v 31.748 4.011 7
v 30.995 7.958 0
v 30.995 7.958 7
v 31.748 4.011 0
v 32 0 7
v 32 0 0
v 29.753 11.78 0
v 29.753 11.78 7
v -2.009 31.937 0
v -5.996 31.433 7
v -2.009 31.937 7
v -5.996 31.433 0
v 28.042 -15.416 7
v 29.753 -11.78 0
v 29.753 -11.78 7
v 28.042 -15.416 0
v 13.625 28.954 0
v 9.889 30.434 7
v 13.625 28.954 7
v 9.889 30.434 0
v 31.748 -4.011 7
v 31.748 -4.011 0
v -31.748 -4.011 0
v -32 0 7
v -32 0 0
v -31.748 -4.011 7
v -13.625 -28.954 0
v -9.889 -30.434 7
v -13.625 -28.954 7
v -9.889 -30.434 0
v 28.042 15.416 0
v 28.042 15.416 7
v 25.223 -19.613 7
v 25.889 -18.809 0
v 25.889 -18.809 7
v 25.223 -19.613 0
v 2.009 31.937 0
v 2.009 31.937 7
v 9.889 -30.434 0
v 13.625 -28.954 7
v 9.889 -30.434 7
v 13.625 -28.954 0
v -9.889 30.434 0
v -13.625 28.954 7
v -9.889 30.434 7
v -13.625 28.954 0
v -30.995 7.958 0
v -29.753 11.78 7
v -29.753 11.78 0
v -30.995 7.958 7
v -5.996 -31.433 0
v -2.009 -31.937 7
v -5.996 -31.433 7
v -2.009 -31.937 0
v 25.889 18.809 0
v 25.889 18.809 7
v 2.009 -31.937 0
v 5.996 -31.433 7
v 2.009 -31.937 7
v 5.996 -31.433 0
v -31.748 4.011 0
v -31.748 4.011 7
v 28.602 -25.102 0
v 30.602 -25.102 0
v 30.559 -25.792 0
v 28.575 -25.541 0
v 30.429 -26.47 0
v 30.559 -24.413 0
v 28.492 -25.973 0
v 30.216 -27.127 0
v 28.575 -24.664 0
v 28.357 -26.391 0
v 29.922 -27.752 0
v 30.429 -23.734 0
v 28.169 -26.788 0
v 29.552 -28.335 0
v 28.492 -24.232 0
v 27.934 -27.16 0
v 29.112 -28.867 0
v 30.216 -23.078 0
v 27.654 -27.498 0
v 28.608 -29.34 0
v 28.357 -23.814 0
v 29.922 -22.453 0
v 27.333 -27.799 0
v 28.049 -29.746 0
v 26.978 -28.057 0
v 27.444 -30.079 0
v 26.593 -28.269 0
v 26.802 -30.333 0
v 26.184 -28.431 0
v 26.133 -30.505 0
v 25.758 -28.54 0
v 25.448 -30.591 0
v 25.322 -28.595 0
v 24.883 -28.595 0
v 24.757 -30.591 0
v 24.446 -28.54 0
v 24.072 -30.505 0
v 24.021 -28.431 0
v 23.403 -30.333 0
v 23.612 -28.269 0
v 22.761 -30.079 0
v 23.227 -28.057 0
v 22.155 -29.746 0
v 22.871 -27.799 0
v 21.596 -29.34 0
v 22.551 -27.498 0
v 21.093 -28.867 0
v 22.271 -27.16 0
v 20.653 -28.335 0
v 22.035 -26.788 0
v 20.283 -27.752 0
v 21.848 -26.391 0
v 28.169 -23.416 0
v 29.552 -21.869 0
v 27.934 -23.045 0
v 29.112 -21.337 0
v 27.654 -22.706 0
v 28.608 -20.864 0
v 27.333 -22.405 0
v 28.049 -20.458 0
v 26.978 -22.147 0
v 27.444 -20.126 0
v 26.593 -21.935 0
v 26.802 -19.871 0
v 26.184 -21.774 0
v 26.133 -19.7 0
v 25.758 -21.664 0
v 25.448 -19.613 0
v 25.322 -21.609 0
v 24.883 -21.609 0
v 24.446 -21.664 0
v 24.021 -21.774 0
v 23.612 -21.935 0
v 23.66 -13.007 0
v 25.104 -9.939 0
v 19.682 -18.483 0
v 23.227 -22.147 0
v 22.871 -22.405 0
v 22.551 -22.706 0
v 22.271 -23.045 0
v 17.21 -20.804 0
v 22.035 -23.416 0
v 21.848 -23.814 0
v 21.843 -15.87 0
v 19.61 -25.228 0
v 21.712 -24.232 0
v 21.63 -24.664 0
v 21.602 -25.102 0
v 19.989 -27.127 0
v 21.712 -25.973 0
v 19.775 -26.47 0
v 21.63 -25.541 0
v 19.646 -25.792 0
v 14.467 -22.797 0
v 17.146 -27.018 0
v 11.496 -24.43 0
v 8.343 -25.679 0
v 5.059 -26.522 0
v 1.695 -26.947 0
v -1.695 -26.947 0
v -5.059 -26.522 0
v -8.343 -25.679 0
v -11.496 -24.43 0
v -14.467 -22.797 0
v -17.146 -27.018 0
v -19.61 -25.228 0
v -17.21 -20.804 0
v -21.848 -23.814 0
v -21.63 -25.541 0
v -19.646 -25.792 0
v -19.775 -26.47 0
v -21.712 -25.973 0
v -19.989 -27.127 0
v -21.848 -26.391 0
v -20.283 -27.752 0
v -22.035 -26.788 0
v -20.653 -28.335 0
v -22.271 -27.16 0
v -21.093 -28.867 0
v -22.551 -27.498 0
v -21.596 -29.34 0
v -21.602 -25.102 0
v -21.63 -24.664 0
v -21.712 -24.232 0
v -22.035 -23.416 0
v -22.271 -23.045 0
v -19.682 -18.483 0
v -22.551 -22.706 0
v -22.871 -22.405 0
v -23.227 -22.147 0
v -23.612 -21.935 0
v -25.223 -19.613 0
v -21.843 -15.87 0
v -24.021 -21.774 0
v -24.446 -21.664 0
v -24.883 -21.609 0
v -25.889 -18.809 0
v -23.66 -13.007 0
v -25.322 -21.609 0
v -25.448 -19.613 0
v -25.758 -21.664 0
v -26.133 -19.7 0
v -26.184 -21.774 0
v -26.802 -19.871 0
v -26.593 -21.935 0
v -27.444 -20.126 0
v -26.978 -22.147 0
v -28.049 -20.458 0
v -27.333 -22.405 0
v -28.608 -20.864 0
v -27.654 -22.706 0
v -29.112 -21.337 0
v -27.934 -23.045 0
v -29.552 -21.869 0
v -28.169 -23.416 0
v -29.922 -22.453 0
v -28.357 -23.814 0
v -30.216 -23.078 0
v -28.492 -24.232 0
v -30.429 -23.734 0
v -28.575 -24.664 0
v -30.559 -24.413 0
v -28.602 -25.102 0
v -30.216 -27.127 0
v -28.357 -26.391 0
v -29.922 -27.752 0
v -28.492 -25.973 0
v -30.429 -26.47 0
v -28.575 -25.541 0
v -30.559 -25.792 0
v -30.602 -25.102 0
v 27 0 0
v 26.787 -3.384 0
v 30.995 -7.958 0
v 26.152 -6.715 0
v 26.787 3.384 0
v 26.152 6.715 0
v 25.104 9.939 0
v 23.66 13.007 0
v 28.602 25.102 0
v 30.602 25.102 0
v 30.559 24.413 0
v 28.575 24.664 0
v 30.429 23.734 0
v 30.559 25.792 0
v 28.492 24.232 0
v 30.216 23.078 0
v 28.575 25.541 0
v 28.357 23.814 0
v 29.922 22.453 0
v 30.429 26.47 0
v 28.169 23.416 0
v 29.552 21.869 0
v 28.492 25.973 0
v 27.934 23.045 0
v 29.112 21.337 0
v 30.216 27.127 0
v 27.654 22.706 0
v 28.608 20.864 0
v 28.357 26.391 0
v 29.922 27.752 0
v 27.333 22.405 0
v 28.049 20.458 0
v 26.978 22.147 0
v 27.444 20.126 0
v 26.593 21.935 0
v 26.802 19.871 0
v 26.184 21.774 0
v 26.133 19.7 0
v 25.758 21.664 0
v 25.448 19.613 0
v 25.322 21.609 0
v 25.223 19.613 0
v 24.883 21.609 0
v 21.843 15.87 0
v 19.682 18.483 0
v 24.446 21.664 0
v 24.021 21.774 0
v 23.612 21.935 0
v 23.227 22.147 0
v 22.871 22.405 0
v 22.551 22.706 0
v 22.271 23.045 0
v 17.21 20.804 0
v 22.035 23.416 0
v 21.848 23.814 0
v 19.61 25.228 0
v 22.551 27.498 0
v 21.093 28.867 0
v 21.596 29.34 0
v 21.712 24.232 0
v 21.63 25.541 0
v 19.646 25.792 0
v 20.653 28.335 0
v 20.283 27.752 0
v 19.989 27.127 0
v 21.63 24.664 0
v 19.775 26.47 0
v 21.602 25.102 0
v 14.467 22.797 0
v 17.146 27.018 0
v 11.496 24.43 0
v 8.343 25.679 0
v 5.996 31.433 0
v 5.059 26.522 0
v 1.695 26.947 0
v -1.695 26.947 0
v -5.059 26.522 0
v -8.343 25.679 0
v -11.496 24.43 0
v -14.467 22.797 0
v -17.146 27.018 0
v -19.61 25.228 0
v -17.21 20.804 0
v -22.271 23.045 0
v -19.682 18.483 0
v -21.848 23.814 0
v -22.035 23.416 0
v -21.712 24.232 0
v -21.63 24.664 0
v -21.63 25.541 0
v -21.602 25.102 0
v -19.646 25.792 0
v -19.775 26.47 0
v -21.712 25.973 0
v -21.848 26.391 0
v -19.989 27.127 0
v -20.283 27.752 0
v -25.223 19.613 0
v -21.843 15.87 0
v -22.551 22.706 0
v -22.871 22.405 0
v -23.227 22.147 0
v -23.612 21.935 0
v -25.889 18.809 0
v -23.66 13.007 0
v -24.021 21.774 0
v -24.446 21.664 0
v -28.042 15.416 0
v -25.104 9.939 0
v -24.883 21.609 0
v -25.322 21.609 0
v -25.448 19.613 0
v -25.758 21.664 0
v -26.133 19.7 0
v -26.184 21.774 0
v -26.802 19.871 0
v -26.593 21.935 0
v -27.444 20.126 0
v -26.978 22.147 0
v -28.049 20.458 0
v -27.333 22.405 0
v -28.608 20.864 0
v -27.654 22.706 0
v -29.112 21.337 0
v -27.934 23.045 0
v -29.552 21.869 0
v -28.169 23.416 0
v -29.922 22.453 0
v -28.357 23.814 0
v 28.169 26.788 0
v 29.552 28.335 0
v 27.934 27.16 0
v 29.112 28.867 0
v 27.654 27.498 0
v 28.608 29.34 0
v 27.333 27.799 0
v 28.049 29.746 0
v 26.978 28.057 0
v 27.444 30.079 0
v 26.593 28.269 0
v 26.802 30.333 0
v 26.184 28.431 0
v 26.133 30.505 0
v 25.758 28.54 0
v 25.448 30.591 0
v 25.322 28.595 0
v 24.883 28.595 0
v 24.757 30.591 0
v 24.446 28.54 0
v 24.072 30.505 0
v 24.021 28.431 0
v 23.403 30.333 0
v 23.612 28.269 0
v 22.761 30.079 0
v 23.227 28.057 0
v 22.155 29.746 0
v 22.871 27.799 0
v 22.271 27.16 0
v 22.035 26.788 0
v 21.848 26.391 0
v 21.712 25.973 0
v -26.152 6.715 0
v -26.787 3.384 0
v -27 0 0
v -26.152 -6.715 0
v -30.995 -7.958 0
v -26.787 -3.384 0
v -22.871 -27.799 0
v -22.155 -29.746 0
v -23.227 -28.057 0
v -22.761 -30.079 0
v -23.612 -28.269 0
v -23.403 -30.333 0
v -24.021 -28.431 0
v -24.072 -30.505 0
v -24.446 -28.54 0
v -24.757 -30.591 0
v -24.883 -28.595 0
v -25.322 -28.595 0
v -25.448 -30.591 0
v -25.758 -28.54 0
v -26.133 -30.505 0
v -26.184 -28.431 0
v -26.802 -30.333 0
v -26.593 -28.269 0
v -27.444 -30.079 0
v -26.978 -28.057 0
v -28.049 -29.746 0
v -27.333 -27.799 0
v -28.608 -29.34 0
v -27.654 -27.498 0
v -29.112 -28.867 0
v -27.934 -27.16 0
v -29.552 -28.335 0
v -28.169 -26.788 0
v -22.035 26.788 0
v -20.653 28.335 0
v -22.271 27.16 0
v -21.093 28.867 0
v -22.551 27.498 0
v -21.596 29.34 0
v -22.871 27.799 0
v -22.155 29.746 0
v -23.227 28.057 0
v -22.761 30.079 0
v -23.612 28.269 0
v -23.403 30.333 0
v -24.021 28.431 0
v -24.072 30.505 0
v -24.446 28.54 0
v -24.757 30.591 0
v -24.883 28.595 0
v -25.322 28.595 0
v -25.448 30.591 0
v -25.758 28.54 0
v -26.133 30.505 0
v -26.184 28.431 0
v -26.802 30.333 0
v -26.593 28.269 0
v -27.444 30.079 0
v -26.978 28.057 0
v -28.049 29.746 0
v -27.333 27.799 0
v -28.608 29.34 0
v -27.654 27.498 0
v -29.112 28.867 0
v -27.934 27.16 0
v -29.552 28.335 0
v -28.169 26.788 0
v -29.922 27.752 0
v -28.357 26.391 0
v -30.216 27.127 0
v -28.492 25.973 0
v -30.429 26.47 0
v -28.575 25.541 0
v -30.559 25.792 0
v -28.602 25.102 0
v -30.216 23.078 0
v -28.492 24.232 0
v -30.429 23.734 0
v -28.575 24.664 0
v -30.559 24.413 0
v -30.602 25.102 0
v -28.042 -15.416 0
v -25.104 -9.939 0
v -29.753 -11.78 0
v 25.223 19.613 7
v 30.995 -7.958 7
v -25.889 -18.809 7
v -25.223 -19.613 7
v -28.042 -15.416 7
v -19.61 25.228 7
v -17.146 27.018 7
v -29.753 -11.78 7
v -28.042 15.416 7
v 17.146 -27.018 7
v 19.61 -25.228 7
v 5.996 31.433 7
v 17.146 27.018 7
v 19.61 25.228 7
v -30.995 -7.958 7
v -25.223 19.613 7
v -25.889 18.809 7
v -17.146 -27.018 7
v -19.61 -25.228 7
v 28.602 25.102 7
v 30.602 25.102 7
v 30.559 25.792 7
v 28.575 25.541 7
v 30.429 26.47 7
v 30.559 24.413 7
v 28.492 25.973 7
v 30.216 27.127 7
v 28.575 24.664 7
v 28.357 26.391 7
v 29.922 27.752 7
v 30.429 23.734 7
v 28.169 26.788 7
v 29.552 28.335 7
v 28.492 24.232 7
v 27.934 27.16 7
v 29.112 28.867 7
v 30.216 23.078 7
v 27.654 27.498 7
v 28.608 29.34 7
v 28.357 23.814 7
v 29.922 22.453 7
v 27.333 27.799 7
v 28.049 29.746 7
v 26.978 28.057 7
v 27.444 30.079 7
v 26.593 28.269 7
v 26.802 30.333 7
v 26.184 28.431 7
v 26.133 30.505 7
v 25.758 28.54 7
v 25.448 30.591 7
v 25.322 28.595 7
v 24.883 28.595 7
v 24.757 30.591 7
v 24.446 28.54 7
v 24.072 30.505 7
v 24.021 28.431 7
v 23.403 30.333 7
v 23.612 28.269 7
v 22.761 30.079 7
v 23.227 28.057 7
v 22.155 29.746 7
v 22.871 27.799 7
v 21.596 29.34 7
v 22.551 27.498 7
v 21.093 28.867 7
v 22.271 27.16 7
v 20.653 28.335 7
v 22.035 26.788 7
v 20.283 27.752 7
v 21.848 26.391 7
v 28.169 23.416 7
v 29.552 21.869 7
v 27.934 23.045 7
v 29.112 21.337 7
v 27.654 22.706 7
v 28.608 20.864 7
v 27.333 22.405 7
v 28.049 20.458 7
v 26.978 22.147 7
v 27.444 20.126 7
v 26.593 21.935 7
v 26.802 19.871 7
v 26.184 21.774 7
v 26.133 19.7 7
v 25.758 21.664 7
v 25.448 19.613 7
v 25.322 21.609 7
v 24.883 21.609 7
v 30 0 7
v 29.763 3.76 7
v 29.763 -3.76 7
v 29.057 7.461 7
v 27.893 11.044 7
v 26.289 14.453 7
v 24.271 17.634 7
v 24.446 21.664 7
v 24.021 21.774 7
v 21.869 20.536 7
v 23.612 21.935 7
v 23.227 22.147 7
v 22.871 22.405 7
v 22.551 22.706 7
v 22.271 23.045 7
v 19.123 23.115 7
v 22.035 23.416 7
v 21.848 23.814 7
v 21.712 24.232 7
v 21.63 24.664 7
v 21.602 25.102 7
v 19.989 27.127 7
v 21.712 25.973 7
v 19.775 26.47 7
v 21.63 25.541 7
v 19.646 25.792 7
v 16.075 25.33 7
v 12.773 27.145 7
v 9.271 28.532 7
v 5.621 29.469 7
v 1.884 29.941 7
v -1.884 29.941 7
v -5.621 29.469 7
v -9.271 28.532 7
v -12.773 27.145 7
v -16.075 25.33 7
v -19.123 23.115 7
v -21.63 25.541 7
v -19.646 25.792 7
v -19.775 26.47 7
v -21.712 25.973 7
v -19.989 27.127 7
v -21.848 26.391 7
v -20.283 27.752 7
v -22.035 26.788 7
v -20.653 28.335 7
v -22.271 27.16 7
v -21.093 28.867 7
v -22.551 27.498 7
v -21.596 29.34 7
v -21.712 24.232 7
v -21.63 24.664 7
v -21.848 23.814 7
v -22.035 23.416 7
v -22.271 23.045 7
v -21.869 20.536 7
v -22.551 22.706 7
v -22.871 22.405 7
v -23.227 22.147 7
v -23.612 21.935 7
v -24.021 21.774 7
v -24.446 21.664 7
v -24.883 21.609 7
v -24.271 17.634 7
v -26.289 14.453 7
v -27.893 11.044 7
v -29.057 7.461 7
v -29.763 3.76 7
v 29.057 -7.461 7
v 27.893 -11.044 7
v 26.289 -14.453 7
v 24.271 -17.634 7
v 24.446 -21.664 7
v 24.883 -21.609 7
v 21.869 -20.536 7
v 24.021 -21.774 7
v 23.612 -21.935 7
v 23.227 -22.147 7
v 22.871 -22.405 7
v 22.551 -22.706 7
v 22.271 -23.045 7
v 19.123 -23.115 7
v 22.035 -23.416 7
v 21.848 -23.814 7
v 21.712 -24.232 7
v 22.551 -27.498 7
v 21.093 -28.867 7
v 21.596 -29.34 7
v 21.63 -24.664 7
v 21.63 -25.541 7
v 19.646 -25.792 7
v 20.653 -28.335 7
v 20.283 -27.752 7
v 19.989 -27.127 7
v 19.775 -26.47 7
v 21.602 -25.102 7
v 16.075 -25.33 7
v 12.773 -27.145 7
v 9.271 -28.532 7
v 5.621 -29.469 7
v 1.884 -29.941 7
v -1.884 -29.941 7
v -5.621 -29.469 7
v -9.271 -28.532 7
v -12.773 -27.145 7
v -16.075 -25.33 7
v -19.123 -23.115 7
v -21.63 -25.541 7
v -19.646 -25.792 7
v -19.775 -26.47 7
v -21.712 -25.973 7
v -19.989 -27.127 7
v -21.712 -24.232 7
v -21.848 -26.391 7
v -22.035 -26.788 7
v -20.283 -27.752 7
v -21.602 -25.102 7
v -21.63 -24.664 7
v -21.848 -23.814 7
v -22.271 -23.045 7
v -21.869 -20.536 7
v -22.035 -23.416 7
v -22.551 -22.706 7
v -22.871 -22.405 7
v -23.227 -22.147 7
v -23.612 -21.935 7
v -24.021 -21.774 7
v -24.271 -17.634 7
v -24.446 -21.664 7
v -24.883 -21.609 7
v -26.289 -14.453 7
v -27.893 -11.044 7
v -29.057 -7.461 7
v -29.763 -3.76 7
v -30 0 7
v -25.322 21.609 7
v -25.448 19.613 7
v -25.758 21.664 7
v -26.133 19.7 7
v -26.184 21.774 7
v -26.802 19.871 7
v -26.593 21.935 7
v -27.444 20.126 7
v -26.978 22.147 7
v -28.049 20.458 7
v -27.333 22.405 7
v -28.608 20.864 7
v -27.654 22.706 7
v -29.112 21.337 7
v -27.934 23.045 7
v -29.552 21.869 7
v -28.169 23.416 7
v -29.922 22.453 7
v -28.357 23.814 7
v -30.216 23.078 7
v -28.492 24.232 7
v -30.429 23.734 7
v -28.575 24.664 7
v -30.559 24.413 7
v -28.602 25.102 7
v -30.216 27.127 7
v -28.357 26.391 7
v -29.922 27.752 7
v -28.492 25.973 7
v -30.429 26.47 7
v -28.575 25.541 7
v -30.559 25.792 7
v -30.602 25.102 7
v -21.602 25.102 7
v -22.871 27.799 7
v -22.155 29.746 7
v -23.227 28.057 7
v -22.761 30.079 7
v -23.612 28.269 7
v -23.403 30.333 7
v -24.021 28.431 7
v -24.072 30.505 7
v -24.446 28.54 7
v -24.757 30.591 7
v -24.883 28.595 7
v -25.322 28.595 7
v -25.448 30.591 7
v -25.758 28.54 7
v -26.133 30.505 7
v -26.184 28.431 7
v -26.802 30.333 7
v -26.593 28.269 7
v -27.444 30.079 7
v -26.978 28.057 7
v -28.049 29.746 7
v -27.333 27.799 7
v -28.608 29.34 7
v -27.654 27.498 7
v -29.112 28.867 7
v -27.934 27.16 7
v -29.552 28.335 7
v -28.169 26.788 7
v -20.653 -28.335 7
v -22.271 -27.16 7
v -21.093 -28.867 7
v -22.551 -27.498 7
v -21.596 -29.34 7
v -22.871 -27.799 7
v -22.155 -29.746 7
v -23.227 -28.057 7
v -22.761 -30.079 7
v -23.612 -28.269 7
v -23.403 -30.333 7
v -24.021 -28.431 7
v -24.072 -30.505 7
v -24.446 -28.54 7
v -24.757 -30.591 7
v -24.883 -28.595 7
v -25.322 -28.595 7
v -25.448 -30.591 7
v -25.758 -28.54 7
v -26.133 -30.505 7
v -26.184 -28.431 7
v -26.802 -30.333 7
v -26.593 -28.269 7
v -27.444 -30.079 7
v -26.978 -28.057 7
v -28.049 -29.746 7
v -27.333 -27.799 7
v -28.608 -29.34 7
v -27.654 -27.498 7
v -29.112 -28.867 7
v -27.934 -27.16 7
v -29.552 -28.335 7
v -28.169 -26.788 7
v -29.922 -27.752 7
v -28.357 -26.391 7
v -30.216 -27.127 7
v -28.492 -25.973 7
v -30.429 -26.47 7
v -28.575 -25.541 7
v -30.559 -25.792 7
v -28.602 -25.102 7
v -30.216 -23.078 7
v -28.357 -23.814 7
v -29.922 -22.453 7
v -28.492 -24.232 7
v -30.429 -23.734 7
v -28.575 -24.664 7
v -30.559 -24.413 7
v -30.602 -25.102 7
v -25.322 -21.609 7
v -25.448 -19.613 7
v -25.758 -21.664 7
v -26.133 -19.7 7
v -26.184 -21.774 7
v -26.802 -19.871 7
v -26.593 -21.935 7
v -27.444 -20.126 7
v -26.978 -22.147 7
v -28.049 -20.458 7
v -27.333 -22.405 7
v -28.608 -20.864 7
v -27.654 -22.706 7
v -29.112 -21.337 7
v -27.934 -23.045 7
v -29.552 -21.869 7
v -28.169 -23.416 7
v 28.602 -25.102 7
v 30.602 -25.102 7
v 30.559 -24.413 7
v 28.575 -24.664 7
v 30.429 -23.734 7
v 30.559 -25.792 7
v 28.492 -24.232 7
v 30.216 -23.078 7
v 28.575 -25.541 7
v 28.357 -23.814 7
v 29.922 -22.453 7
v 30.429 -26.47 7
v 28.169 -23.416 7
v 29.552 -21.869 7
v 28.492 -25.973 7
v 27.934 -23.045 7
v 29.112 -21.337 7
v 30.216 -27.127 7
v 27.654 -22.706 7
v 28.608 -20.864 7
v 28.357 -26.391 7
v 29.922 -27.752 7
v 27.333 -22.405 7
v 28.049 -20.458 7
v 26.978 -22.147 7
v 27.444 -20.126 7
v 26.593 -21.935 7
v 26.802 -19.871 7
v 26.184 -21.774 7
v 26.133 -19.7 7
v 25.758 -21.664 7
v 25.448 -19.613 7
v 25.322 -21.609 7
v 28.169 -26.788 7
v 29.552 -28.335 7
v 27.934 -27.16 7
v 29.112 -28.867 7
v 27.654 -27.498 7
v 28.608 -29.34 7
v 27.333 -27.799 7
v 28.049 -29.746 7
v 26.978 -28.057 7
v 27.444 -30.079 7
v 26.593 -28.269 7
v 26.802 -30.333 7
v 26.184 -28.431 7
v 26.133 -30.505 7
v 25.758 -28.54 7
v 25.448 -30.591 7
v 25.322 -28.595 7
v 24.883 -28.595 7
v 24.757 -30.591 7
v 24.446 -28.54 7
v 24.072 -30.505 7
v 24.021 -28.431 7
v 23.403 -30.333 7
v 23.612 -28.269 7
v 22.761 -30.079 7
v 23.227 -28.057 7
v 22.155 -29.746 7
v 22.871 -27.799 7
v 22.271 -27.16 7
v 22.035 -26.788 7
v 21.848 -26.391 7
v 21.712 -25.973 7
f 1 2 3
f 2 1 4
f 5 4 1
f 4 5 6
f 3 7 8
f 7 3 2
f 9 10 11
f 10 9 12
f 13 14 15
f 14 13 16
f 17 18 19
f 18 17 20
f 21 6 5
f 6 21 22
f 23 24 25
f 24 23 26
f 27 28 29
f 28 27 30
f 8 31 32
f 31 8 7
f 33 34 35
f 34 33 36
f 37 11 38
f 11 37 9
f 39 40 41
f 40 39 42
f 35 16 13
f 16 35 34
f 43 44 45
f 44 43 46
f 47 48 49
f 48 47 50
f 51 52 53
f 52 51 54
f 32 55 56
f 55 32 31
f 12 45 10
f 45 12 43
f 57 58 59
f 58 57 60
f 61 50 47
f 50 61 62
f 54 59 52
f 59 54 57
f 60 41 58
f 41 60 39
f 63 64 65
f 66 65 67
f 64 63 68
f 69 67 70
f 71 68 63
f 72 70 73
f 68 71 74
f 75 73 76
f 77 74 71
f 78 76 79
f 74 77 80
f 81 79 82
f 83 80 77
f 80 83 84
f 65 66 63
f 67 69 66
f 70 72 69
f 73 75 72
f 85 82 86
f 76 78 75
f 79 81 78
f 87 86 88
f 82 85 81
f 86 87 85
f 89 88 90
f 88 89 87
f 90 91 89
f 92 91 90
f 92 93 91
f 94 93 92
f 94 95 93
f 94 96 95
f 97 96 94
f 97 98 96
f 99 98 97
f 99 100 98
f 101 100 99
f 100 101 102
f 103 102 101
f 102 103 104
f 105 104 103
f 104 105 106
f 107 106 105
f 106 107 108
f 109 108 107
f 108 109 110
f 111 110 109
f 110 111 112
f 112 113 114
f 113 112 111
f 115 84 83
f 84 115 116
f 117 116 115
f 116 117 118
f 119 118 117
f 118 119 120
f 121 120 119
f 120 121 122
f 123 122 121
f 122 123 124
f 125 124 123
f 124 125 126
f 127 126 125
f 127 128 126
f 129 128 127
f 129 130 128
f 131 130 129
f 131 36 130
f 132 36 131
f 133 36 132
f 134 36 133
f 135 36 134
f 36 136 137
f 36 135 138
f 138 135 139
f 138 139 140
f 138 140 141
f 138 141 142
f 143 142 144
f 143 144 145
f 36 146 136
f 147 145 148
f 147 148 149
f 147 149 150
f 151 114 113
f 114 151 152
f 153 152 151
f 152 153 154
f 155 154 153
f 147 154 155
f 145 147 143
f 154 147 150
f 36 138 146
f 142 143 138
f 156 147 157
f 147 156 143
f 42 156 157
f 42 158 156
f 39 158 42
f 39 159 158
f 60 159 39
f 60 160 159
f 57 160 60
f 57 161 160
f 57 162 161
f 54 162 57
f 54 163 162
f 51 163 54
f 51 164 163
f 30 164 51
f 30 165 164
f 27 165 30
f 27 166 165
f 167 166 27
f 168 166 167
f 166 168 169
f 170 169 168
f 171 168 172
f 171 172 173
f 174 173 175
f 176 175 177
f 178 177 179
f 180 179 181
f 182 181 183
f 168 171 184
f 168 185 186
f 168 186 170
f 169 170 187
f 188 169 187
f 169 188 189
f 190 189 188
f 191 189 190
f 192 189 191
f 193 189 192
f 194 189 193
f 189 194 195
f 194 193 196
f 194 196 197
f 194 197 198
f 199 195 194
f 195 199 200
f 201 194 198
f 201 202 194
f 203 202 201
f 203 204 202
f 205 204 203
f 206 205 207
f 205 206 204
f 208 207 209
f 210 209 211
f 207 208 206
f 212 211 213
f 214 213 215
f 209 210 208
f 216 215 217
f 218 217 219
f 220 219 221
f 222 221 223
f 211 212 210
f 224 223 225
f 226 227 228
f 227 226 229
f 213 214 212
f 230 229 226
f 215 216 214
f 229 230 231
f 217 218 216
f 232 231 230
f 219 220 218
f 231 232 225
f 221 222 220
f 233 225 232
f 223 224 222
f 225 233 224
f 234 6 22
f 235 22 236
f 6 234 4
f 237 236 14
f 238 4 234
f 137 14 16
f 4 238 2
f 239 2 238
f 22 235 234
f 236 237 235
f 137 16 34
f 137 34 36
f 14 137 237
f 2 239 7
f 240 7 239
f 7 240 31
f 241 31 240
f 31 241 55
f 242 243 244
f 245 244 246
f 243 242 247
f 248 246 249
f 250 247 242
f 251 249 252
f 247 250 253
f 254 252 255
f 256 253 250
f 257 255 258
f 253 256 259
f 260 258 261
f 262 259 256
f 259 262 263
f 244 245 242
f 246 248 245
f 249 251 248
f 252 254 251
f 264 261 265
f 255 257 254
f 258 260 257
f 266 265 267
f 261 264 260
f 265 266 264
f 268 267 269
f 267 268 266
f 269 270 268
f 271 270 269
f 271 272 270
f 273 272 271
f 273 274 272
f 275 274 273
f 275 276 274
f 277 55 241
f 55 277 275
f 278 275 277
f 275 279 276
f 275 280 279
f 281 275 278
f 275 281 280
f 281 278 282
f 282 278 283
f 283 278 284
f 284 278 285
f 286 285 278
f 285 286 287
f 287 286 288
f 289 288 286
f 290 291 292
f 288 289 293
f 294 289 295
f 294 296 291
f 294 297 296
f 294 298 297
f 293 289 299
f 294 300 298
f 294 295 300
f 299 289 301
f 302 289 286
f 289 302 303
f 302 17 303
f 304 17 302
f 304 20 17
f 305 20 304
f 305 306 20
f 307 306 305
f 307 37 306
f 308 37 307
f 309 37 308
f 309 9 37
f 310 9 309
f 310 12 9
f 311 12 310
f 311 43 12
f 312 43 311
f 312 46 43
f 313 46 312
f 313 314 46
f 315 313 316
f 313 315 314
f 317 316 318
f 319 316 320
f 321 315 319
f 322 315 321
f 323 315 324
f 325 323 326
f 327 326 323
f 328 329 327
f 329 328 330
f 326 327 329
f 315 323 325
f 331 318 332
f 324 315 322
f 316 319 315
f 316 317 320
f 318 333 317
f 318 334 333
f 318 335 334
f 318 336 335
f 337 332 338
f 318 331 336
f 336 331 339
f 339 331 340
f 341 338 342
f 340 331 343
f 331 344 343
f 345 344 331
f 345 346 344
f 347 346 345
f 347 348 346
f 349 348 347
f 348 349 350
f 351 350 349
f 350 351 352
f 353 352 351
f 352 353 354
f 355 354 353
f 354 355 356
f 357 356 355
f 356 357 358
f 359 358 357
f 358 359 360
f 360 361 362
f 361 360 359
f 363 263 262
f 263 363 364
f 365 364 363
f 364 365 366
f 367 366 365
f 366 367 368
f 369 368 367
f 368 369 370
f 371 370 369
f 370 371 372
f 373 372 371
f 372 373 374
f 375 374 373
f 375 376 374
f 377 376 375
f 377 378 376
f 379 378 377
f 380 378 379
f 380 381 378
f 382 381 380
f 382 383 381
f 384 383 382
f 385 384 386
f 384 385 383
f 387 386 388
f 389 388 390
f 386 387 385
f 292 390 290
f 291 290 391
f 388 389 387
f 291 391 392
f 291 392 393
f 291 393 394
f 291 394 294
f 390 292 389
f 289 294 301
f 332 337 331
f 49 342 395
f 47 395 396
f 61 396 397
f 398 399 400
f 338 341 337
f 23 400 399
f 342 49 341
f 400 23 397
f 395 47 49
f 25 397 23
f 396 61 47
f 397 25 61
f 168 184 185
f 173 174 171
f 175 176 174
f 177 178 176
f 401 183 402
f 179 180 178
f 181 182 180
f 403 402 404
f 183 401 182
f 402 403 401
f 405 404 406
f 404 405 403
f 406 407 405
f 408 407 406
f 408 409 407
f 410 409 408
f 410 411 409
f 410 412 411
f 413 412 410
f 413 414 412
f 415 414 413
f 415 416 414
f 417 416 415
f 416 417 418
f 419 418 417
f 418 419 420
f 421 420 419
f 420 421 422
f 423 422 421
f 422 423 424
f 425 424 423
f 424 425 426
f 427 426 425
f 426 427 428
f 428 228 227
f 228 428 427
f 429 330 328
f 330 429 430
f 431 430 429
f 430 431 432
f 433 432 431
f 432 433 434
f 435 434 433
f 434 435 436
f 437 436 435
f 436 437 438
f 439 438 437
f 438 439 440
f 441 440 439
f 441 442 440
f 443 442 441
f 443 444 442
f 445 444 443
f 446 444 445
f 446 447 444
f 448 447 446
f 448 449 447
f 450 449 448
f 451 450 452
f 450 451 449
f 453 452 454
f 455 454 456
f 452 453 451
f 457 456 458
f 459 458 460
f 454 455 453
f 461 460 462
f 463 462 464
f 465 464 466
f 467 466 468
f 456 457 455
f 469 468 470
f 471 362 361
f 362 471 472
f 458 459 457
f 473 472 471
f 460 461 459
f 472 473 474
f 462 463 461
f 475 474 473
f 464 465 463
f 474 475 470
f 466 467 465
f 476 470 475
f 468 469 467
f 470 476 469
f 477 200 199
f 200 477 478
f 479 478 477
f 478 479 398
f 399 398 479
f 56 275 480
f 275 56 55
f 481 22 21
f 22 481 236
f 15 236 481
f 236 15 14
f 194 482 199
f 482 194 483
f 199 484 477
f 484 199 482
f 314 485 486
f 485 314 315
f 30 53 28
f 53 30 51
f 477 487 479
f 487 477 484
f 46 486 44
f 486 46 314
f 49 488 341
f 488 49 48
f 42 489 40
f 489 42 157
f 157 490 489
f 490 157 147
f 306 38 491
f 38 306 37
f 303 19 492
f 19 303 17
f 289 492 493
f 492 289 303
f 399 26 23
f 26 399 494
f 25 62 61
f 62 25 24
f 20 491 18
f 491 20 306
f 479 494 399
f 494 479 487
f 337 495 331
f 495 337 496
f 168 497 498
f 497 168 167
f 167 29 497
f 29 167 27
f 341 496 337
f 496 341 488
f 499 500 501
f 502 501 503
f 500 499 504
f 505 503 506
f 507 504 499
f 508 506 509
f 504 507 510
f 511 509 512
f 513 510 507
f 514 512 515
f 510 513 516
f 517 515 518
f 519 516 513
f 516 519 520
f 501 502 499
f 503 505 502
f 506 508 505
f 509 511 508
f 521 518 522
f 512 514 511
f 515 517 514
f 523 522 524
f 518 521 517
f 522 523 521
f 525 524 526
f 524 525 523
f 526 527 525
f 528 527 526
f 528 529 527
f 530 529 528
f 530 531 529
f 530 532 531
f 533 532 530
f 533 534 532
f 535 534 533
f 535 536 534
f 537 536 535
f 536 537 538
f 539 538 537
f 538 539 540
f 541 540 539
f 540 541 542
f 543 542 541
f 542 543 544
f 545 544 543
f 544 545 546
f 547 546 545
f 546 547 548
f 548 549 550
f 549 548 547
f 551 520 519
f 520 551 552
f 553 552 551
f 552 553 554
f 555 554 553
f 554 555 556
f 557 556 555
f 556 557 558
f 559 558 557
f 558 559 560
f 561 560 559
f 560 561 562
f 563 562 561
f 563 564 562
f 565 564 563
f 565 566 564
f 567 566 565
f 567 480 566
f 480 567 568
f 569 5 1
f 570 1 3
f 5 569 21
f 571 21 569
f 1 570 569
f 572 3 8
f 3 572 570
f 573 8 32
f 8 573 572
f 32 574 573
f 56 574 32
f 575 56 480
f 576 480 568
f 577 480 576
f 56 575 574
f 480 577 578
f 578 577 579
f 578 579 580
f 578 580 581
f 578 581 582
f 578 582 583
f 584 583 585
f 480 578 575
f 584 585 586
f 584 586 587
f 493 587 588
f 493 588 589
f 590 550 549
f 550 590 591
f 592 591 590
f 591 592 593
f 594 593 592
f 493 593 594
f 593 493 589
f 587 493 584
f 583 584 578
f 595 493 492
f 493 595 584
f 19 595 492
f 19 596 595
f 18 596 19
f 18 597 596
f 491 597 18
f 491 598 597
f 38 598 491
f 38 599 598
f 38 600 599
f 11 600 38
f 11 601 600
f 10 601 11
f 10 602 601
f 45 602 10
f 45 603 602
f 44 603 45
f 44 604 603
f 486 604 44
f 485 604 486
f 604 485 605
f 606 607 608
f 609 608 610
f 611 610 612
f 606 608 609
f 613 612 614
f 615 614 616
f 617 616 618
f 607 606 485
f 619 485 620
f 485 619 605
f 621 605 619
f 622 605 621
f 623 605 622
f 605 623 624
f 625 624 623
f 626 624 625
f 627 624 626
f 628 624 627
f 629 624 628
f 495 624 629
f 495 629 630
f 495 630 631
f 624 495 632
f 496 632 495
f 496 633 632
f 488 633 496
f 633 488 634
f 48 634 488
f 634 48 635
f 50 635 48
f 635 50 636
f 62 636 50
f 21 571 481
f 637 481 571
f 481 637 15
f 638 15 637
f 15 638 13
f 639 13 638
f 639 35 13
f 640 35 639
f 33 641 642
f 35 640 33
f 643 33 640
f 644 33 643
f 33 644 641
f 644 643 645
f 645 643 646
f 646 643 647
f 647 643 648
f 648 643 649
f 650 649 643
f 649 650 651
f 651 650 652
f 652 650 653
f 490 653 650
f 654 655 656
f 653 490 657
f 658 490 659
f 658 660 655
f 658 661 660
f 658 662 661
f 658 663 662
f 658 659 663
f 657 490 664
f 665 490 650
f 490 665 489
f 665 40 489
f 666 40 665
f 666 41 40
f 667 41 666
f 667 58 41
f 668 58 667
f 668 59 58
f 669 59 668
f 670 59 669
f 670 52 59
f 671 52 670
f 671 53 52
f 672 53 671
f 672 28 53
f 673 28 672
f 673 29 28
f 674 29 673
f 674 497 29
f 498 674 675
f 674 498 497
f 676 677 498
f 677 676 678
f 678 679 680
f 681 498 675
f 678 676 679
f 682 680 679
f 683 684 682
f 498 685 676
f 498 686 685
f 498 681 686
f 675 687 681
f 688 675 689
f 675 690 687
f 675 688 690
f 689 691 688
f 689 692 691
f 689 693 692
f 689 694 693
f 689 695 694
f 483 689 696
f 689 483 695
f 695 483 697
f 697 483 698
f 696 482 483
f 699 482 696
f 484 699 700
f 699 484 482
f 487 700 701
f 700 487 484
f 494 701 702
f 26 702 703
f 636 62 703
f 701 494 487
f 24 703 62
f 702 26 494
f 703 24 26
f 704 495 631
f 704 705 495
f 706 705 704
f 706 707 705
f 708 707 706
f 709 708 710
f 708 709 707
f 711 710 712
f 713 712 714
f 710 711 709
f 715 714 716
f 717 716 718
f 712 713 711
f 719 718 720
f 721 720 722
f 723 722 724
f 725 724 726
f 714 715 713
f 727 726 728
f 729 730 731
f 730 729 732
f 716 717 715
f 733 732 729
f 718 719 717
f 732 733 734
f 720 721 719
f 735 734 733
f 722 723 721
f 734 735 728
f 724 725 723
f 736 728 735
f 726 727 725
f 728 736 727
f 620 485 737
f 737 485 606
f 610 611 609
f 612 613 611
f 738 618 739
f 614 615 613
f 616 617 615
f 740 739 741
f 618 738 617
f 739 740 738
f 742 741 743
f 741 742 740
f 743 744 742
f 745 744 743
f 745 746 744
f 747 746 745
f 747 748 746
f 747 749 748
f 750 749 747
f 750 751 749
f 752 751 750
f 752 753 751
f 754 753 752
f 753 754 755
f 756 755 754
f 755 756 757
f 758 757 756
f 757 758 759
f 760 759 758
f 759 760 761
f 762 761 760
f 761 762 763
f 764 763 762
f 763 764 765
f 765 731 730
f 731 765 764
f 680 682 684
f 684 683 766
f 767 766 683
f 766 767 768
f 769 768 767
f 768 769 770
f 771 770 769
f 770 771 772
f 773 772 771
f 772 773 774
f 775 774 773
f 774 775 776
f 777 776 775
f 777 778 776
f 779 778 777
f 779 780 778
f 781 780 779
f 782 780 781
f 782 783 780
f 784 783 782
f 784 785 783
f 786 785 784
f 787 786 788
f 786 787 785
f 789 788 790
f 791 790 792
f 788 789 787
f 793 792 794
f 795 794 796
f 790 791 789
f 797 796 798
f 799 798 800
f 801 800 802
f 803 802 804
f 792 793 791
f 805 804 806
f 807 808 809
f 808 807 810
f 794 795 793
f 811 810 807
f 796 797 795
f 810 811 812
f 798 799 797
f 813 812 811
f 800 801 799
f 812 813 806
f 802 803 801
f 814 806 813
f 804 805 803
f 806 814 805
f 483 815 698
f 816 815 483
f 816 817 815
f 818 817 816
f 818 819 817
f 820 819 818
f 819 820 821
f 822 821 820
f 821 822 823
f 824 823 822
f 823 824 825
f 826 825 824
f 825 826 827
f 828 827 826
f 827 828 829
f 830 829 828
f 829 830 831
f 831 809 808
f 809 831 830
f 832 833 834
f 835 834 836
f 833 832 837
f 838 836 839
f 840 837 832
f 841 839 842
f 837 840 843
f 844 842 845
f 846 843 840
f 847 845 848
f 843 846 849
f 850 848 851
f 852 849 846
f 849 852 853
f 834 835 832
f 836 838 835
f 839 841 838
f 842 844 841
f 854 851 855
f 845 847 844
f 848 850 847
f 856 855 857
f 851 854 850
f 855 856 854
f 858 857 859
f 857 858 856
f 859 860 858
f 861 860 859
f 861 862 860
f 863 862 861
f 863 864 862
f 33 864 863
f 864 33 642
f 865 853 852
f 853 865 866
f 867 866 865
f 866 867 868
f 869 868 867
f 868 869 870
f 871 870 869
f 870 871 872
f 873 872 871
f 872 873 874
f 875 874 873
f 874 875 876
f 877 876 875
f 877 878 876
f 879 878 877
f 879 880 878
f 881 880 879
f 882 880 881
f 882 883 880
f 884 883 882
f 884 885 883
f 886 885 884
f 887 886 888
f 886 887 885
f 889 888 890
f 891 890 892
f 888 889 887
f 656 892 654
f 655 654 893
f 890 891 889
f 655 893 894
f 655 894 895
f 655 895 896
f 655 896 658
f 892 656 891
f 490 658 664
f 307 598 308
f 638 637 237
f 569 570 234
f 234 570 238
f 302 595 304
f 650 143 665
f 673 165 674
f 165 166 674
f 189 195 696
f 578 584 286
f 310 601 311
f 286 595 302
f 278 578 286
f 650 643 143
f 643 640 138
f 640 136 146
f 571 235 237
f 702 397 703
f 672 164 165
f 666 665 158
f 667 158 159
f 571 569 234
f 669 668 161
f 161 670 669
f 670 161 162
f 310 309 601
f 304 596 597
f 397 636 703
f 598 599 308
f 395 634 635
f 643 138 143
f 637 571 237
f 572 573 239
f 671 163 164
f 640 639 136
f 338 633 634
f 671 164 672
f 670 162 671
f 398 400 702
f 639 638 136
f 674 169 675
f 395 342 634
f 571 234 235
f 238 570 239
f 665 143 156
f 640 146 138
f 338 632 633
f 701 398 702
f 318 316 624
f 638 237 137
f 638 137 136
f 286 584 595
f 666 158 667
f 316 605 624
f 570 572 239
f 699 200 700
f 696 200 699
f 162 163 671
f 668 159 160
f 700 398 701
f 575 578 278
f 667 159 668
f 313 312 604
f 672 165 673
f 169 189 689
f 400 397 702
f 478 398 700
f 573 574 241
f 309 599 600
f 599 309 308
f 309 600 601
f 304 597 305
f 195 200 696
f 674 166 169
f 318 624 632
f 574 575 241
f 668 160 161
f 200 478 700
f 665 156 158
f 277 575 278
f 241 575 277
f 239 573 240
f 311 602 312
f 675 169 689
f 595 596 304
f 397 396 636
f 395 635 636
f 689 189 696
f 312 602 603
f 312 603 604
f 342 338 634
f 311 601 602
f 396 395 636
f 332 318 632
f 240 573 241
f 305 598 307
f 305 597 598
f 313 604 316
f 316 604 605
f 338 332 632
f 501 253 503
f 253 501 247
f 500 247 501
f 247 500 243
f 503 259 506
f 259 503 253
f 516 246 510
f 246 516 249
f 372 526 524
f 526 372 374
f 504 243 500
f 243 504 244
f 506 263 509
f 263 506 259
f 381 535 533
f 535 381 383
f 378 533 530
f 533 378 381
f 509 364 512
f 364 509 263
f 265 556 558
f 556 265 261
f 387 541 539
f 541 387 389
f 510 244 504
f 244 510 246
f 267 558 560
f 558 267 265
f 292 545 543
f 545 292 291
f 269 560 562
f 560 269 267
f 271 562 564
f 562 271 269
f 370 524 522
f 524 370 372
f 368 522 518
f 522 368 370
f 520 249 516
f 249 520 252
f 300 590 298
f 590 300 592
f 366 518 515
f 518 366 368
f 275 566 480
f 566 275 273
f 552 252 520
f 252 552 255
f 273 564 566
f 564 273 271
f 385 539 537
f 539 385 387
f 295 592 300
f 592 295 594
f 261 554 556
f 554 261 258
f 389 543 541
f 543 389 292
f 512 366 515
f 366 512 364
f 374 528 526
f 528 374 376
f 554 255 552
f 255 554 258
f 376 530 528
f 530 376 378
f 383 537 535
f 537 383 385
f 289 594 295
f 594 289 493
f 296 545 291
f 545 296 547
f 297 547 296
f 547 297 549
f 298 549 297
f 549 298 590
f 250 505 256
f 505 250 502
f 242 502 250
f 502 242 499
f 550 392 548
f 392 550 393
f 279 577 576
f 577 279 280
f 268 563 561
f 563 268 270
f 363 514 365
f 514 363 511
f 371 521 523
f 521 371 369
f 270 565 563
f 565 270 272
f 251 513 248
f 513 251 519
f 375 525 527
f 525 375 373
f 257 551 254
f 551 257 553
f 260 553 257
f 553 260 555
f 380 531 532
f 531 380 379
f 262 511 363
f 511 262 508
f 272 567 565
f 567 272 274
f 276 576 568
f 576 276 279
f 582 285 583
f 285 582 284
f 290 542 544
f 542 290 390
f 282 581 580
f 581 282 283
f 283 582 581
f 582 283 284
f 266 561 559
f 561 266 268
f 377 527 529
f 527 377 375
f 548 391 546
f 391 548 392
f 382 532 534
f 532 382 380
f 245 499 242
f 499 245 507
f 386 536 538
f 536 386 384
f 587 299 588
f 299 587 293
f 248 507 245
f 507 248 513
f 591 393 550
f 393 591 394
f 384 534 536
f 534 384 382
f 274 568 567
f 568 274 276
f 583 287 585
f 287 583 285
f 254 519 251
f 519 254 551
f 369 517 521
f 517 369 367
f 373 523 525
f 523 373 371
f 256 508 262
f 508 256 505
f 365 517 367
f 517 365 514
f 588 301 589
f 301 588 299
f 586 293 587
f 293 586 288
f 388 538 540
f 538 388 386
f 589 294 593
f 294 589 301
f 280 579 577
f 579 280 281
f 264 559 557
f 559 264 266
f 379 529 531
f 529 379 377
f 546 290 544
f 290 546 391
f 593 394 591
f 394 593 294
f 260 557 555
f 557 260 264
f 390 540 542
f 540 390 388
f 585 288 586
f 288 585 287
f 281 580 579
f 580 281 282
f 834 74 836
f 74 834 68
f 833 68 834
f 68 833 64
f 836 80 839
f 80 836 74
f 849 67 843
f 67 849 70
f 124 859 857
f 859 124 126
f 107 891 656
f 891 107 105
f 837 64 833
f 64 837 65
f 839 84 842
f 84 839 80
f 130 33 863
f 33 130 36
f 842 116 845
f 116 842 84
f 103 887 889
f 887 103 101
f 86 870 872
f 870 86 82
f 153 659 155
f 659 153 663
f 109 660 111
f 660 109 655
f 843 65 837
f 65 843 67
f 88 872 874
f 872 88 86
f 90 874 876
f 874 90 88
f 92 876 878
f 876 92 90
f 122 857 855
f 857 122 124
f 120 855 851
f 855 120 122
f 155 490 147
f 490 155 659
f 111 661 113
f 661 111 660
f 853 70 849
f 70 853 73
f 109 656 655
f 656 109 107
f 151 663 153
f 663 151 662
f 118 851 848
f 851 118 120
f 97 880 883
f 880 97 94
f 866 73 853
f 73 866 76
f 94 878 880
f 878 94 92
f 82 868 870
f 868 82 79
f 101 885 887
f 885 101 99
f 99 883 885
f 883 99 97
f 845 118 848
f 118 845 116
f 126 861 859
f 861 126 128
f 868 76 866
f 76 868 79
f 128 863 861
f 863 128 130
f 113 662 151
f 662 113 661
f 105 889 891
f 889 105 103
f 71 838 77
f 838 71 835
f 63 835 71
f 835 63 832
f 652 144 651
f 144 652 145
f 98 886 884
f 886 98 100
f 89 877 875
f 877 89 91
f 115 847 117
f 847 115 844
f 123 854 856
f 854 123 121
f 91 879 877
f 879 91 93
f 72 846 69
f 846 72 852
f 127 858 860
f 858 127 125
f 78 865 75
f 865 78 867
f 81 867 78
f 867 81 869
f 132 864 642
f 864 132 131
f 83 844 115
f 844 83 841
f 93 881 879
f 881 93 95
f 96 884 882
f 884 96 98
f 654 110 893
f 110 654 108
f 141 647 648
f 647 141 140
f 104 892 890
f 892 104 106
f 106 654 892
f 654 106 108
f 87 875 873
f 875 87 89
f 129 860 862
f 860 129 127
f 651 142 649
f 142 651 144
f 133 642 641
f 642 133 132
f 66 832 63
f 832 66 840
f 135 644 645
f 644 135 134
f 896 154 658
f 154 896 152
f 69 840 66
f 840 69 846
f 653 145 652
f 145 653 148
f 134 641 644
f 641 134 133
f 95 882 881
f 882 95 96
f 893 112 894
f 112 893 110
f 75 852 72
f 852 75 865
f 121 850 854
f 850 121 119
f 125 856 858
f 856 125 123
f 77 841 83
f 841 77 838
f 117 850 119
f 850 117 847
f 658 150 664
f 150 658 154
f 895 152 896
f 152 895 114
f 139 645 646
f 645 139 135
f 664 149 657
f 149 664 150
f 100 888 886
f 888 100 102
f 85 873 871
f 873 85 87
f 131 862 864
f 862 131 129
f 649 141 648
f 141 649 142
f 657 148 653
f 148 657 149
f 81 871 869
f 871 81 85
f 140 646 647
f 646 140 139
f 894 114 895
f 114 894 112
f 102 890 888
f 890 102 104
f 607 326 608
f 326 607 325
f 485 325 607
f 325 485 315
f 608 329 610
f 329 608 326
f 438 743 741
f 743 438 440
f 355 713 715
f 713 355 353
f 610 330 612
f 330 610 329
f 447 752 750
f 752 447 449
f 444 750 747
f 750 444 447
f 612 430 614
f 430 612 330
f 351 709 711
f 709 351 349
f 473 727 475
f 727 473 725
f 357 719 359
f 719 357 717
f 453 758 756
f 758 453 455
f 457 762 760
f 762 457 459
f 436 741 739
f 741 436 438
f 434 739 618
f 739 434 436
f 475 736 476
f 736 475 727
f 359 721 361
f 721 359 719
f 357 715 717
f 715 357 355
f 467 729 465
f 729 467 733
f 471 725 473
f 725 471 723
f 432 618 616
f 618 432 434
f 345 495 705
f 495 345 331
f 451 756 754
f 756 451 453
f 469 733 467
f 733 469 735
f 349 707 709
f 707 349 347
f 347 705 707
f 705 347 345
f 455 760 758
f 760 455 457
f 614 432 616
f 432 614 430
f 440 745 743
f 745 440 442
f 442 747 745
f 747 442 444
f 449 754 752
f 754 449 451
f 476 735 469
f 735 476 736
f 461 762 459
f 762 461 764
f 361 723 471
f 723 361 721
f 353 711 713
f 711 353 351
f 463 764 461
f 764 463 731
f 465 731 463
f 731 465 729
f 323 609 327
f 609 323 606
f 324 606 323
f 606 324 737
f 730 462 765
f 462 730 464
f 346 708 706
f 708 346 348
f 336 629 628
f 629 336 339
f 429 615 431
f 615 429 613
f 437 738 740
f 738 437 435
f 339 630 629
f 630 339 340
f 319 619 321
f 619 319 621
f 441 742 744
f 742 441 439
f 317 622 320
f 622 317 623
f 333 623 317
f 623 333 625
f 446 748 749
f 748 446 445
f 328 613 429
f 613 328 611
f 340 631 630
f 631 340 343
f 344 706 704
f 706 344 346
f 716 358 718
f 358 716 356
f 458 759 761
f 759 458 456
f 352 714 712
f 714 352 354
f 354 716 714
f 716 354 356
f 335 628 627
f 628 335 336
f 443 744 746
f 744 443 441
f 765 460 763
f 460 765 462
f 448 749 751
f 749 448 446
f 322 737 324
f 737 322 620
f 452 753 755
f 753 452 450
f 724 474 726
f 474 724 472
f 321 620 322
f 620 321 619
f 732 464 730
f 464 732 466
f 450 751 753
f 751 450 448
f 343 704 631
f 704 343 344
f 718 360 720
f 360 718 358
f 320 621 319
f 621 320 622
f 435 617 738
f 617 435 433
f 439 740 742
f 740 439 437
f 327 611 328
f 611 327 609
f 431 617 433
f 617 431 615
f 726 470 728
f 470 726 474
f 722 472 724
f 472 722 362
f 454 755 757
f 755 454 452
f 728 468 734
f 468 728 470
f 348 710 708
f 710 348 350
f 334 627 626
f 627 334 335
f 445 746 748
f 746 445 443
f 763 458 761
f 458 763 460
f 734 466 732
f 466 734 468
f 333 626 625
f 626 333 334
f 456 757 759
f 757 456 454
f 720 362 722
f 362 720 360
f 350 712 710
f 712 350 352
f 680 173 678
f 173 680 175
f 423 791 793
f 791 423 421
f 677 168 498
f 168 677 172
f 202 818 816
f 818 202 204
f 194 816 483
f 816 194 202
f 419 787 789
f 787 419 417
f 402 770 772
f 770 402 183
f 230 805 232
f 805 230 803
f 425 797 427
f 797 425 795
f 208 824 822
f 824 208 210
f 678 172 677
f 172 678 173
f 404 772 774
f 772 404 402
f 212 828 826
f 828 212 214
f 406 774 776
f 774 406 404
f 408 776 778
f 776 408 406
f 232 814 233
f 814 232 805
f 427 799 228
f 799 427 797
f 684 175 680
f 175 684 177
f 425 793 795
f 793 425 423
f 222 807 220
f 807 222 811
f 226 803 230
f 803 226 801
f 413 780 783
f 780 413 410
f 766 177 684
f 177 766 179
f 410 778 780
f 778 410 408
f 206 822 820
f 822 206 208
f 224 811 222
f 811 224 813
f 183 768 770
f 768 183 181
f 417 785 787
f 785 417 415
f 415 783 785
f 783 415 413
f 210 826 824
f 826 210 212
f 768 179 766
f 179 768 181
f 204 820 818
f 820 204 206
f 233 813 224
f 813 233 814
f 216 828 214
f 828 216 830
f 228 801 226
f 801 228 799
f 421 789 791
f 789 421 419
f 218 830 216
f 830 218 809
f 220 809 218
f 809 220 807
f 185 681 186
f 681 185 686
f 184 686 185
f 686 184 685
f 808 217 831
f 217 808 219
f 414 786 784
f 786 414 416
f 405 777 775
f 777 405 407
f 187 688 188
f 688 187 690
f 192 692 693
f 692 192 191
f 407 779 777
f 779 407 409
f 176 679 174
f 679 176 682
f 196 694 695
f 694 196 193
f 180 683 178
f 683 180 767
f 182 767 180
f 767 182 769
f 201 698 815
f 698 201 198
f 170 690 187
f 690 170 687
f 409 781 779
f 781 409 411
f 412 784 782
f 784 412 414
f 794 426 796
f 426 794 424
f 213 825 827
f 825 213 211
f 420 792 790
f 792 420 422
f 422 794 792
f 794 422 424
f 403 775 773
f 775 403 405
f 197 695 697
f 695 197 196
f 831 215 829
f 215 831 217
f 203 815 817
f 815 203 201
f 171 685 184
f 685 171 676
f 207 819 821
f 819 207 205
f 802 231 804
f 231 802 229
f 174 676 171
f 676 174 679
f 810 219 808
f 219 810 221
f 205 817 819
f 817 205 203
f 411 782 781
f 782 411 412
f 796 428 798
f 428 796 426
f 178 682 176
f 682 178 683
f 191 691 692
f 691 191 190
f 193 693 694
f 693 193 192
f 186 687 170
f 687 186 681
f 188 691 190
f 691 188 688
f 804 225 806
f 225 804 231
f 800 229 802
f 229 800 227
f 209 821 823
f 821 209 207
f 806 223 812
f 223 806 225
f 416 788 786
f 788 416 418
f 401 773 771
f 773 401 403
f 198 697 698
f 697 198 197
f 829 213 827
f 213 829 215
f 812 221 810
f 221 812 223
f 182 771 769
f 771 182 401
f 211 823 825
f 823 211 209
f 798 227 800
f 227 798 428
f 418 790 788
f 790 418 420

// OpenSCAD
bottleInnerDiamH = 60;
bottleInnerDiamL = 54;
holderThickness = 4;
holderHigh = 7;

stickDiam = 7;
circlepos = bottleInnerDiamH / 2 + stickDiam / 2 + holderThickness / 2;

$fn = 50;

module mainCyl() {
    difference() {
        cylinder(d=bottleInnerDiamH + holderThickness, h=holderHigh);

        cylinder(d1=bottleInnerDiamL, d2=bottleInnerDiamH, h=holderHigh);
    }
}

module stickHolder(angle) {
    translate([circlepos * sin(angle),circlepos * cos(angle),0])
    difference() {
        cylinder(d=stickDiam + holderThickness, h=holderHigh);

        cylinder(d=stickDiam, h=holderHigh);
    }
}

union() {
    mainCyl();

    stickHolder(45);
    stickHolder(135);
    stickHolder(-45);
    stickHolder(-135);
}
